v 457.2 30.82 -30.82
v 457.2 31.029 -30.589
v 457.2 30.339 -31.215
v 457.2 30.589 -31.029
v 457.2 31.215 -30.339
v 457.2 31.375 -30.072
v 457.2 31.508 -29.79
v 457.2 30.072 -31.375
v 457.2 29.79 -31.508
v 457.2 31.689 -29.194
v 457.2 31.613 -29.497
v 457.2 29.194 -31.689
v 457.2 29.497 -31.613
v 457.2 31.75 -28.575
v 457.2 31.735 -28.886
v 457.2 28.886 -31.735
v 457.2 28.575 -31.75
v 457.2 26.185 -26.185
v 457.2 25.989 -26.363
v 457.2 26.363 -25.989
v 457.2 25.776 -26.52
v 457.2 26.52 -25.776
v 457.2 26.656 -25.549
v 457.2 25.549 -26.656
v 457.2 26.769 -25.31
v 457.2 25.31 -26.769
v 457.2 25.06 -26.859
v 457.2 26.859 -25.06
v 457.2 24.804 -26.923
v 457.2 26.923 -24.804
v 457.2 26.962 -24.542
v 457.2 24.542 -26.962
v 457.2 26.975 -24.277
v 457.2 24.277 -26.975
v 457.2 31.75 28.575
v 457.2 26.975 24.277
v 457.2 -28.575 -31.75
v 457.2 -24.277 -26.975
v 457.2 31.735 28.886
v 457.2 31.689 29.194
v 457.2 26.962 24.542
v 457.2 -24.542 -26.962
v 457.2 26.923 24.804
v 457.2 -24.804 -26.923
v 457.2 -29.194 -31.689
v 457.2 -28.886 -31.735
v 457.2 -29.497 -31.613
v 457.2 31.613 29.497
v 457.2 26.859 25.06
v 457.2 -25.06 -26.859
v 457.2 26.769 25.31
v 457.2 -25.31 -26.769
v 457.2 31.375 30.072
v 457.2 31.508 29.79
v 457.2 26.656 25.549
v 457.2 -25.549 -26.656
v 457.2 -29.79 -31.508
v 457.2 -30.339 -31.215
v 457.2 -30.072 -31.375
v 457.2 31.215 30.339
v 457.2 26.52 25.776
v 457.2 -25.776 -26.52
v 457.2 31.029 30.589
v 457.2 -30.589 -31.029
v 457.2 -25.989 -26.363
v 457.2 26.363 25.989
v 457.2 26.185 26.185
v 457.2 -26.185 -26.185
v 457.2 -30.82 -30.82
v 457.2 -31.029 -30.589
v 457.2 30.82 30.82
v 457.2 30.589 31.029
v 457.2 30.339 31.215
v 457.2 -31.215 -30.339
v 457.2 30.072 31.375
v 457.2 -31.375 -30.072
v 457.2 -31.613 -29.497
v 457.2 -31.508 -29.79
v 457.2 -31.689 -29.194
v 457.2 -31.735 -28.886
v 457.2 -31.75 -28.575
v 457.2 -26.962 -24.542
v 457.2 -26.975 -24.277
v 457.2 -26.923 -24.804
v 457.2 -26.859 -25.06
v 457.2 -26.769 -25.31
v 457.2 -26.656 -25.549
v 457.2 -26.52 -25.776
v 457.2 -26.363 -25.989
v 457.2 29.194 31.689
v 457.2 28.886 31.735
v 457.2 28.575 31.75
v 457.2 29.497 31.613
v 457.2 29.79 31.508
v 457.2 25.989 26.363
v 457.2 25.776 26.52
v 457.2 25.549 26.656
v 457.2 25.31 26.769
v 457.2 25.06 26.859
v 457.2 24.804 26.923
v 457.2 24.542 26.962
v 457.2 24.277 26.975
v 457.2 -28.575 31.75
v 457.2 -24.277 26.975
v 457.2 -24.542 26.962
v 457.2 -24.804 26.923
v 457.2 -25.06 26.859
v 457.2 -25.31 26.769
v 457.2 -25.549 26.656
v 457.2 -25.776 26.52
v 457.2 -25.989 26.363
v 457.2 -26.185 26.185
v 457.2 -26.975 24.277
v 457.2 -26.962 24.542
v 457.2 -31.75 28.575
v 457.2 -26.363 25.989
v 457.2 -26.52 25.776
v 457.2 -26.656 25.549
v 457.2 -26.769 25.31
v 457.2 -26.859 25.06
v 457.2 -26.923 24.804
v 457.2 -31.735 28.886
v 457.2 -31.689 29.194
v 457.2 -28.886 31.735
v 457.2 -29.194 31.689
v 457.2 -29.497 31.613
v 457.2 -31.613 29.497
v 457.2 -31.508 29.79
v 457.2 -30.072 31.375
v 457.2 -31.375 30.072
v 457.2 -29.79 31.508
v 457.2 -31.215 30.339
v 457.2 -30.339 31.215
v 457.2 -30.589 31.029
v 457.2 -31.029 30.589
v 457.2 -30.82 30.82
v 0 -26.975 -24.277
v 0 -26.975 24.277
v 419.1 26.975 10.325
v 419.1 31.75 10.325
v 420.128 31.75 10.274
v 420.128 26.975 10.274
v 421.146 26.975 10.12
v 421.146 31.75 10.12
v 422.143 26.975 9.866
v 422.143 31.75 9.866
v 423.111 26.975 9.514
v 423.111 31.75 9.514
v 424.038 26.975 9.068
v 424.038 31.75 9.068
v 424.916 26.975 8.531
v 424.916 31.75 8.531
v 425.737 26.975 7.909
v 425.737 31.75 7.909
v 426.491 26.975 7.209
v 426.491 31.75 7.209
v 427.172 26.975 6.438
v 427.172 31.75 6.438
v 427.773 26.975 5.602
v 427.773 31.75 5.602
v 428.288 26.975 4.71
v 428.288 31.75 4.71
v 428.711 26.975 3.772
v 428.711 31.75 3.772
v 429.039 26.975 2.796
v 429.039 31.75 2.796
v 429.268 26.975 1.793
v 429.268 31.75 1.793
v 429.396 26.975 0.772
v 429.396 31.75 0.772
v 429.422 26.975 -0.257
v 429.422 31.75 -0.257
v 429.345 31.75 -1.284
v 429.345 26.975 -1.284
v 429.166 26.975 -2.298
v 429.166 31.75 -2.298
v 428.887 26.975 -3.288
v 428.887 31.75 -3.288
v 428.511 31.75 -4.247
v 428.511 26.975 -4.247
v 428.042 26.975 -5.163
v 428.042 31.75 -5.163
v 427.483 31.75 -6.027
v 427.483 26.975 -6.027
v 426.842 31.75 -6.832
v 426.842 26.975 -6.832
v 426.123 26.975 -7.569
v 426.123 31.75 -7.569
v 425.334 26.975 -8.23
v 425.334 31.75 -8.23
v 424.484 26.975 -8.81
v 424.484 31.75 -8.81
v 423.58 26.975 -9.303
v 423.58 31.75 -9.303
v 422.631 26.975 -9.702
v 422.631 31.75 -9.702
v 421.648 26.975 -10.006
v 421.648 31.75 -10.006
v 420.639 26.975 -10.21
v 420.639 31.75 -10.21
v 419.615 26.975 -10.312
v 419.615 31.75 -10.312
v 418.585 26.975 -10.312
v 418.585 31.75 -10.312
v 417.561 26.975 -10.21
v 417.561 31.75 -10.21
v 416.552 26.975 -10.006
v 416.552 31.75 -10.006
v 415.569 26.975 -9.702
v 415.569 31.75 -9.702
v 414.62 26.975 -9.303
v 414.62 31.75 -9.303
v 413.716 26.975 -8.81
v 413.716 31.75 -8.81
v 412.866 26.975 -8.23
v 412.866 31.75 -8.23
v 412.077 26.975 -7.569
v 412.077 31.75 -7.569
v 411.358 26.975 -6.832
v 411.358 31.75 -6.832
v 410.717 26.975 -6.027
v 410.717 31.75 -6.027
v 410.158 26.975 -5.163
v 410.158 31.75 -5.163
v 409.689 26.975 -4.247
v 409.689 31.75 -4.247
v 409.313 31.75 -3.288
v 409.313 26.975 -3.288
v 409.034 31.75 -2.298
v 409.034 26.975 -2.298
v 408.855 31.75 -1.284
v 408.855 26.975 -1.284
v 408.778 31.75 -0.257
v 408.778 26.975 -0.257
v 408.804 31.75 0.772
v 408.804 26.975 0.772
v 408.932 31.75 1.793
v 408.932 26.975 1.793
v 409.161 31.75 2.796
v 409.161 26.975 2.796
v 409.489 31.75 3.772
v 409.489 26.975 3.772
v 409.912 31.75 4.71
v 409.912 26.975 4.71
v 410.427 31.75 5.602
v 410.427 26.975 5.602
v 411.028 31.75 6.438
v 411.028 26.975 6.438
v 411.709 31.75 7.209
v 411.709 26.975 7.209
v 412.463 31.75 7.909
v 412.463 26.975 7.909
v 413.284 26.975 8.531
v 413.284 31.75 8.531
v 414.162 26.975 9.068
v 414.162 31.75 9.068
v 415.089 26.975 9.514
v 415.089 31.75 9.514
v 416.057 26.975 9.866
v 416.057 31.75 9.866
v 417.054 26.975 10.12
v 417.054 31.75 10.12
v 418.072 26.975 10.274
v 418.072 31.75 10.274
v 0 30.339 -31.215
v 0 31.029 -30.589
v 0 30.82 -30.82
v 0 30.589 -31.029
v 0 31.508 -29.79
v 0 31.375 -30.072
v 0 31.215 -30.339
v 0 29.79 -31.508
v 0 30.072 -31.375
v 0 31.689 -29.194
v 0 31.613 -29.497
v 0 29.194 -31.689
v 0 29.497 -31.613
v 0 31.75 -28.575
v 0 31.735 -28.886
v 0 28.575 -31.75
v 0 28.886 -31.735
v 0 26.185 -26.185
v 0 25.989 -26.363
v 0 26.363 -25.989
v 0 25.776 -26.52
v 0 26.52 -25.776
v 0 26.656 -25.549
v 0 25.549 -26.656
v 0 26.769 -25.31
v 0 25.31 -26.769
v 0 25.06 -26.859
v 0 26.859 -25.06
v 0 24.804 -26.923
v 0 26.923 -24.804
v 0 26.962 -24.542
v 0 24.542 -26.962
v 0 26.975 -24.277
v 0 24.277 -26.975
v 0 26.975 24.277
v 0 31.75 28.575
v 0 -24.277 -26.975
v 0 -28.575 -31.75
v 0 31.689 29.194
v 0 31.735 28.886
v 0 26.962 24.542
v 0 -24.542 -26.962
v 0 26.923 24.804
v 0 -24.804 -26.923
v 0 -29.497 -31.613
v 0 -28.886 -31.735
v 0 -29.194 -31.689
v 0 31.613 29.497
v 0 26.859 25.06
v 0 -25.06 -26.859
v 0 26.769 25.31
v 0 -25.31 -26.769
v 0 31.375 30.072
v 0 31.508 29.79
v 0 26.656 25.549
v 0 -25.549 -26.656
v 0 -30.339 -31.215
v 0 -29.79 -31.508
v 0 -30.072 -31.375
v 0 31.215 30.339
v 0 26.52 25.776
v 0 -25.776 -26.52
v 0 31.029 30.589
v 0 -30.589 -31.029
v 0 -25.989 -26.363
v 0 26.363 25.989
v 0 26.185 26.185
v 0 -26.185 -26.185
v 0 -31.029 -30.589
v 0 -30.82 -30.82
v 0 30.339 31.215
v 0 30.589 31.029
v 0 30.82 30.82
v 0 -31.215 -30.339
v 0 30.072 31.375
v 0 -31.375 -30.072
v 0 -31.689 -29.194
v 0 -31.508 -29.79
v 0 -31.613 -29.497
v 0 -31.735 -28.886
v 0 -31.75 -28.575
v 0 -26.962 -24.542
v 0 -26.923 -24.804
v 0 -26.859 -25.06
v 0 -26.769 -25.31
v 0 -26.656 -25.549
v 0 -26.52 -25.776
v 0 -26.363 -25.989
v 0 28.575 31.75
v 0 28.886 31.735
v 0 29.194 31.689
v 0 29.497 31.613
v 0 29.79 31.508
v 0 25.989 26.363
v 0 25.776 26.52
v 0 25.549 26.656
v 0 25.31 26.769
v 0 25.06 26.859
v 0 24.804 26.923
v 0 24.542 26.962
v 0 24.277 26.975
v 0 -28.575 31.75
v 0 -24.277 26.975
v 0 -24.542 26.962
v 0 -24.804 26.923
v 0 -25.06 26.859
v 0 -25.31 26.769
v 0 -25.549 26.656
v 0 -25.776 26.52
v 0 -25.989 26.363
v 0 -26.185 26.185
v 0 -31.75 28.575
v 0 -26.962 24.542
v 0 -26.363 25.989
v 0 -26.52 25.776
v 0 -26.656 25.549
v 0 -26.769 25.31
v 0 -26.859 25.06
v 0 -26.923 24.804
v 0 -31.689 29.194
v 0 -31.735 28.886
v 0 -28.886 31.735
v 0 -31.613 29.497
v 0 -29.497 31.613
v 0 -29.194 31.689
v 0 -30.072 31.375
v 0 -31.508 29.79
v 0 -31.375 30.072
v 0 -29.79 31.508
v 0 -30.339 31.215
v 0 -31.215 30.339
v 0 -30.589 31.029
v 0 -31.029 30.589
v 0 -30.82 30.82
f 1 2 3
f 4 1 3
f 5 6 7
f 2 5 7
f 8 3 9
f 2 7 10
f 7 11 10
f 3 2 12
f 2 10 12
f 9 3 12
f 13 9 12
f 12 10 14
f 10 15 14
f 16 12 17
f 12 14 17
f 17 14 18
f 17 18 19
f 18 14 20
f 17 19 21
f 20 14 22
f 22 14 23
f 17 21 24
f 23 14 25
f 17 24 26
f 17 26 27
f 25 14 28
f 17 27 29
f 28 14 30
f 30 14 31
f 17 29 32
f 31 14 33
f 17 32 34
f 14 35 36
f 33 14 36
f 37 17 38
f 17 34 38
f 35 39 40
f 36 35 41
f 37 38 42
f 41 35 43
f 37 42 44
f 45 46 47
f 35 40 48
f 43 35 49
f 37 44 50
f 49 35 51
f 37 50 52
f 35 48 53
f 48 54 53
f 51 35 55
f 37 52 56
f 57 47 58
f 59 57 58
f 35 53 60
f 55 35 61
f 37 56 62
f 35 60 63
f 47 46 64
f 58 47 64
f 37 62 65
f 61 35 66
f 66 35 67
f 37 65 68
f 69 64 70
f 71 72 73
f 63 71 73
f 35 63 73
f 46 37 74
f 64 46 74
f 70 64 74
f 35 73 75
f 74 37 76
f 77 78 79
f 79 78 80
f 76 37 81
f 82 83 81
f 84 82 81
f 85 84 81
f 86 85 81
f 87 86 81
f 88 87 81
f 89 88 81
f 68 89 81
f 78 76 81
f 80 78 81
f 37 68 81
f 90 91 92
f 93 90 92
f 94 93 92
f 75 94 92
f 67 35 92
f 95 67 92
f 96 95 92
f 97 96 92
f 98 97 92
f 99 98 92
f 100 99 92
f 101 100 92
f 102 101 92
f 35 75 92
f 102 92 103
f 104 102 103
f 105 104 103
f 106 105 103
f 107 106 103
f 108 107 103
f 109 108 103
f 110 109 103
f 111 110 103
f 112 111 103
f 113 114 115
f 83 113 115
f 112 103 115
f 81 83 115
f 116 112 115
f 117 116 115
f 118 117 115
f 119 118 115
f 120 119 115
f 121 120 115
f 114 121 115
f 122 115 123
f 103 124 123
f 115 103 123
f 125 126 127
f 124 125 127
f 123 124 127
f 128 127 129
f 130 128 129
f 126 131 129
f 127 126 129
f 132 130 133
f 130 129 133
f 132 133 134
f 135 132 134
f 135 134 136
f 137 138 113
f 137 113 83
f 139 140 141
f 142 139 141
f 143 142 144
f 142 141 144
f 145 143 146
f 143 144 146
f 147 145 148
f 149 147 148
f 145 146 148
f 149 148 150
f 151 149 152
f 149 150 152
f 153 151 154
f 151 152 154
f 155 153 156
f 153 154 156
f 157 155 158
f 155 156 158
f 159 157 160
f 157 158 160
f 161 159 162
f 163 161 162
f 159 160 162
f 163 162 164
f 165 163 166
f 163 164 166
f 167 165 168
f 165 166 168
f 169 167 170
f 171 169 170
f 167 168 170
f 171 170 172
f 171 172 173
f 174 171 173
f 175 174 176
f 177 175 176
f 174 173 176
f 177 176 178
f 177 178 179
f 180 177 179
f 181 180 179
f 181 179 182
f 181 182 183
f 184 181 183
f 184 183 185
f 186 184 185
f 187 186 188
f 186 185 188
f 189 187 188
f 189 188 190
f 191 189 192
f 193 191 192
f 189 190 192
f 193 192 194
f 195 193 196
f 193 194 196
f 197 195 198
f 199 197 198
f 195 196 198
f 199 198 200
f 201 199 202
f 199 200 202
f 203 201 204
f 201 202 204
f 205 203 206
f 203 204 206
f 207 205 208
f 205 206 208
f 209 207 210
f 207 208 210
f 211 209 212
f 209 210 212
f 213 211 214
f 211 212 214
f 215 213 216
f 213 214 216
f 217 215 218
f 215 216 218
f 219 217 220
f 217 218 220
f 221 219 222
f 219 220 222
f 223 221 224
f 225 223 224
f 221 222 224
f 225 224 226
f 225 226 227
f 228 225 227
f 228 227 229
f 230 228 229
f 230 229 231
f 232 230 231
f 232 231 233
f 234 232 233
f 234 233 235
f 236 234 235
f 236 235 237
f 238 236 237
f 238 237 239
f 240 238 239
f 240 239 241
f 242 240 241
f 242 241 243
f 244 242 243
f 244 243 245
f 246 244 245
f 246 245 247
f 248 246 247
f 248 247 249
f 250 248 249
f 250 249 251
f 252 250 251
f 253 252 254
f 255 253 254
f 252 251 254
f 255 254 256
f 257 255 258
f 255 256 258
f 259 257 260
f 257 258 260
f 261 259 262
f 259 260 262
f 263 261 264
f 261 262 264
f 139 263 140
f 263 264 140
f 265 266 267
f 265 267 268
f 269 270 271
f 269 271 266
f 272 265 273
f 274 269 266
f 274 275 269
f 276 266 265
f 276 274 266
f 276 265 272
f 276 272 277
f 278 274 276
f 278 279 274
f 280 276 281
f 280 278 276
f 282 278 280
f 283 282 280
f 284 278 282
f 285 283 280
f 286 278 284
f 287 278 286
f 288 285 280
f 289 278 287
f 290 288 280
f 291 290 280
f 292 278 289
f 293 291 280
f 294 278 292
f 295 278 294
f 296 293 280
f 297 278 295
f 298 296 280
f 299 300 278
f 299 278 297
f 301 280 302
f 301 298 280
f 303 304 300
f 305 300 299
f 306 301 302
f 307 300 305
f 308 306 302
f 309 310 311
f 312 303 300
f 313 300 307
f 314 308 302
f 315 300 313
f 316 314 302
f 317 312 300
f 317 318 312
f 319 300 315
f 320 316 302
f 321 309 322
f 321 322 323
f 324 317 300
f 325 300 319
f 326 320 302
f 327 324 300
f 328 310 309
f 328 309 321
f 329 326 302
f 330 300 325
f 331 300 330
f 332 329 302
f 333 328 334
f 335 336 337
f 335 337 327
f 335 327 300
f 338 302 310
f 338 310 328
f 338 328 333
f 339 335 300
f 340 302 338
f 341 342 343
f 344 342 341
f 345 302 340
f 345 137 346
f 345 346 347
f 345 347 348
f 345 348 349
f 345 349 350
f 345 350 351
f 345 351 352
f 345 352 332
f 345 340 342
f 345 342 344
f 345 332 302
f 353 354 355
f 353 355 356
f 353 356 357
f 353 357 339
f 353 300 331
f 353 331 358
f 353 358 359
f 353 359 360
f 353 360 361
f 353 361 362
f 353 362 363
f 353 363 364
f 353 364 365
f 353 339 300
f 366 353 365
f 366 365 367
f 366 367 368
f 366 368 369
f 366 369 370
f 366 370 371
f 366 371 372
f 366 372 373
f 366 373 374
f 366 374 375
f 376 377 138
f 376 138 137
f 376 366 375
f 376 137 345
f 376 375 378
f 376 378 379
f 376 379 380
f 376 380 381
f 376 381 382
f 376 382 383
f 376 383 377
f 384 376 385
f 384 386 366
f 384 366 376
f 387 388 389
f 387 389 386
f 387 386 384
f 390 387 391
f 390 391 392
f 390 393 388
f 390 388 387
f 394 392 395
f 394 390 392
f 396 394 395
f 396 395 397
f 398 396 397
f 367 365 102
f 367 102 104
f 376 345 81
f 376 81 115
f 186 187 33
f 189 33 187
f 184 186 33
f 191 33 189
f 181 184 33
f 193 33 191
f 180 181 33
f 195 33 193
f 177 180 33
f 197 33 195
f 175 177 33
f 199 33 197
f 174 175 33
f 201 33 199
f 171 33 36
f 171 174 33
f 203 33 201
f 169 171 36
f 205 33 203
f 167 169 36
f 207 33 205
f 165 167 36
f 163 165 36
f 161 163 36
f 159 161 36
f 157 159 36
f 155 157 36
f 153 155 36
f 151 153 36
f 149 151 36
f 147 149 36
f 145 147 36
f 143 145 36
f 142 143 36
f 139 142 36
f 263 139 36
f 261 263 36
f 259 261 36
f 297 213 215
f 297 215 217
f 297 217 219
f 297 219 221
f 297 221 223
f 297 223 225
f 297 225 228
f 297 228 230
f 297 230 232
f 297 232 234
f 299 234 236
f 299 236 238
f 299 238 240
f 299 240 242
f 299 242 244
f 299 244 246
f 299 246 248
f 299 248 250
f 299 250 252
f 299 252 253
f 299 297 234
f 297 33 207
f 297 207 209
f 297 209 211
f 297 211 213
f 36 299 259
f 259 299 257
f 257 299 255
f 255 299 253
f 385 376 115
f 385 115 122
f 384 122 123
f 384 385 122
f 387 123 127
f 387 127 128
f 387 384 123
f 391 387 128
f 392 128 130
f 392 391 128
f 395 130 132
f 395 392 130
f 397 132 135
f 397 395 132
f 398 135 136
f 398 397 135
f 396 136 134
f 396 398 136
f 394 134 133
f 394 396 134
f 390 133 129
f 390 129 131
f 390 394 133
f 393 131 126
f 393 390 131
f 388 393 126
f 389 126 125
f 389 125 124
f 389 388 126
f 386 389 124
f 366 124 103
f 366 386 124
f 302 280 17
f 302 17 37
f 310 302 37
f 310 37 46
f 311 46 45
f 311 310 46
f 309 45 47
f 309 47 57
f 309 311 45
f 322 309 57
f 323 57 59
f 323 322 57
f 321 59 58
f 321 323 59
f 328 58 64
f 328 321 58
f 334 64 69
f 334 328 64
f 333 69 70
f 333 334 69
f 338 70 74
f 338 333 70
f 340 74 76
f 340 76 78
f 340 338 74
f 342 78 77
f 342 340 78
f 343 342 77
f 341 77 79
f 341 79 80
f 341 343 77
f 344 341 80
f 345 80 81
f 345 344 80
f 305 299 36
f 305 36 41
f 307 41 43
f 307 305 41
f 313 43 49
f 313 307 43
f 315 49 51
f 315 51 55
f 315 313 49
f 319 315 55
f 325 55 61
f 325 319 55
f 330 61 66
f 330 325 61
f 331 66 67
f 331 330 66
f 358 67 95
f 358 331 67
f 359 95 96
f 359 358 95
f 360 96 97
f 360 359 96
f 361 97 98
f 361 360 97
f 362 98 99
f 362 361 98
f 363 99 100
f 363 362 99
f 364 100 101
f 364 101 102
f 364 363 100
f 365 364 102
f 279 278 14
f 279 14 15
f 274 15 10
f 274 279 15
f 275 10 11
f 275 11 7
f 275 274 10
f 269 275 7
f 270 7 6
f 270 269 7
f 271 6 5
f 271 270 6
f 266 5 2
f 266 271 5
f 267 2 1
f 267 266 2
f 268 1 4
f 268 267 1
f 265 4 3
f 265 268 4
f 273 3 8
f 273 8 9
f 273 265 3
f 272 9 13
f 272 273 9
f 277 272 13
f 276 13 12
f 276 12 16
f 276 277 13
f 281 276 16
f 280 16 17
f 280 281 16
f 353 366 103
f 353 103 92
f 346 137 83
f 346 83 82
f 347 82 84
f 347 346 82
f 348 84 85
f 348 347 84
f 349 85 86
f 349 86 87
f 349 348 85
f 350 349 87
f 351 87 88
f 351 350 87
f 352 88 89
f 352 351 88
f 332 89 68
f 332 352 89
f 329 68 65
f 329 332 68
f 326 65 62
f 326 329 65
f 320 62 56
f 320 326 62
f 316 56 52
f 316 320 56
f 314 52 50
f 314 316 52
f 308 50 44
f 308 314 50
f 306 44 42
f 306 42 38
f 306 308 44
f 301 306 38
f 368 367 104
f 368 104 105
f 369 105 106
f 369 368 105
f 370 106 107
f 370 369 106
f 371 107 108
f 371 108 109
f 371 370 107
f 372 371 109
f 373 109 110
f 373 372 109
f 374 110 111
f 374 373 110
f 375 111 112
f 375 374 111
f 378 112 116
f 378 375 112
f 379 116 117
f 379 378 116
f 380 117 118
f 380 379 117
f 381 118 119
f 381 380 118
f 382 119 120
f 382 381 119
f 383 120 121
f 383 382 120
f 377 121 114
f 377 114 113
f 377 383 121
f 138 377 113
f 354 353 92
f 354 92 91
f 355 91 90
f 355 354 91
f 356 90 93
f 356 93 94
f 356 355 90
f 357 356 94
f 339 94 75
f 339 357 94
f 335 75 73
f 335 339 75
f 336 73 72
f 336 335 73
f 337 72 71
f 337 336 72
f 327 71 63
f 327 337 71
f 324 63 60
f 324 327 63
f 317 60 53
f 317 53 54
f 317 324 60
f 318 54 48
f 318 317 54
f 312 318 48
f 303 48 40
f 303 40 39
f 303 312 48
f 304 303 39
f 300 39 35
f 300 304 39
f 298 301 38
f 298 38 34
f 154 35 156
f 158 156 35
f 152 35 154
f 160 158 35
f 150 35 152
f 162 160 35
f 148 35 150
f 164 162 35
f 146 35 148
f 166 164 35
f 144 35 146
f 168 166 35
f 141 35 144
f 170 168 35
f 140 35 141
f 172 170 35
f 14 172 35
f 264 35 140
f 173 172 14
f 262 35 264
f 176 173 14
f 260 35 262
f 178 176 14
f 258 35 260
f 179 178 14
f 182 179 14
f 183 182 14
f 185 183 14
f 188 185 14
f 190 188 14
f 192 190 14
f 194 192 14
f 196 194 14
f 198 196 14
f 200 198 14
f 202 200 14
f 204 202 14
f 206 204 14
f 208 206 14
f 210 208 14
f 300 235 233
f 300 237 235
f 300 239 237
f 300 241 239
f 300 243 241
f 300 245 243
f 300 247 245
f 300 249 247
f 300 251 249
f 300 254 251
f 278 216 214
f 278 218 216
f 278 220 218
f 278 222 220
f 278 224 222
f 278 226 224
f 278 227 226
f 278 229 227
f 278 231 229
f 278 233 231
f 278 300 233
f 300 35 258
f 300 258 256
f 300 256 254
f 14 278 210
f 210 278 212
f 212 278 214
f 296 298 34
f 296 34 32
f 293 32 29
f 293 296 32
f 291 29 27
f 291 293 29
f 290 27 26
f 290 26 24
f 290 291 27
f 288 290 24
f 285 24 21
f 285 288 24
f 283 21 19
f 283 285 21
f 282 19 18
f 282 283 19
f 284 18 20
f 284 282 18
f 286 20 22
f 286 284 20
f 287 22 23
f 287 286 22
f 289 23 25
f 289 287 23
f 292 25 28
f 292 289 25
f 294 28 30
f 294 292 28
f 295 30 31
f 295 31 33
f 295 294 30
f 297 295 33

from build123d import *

# Parameters (mm, degrees)
SQUARE_TUBE_2_5X2_5X_188_A500_1_DEPTH = 457.2
SKETCH3_R                             = 10.3251
CUT_EXTRUDE1_DEPTH                    = 4.7752


with BuildPart() as part:
    # Sketch1 → Square tube 2.5X2.5X.188 A500(1) (new body)
    with BuildSketch(Plane.YZ):
        with BuildLine():
            Line((28.575, -31.75), (-28.575, -31.75))
            ThreePointArc((-28.575, -31.75), (-30.82006403, -30.82006403), (-31.75, -28.575))
            Line((-31.75, -28.575), (-31.75, 28.575))
            ThreePointArc((-31.75, 28.575), (-30.82006403, 30.82006403), (-28.575, 31.75))
            Line((-28.575, 31.75), (28.575, 31.75))
            ThreePointArc((28.575, 31.75), (30.82006403, 30.82006403), (31.75, 28.575))
            Line((31.75, 28.575), (31.75, -28.575))
            ThreePointArc((31.75, -28.575), (30.82006403, -30.82006403), (28.575, -31.75))
        make_face()
        with BuildLine():
            Line((24.27732, 26.9748), (-24.27732, 26.9748))
            ThreePointArc((-24.27732, 26.9748), (-26.1847264, 26.1847264), (-26.9748, 24.27732))
            Line((-26.9748, 24.27732), (-26.9748, -24.27732))
            ThreePointArc((-26.9748, -24.27732), (-26.1847264, -26.1847264), (-24.27732, -26.9748))
            Line((-24.27732, -26.9748), (24.27732, -26.9748))
            ThreePointArc((24.27732, -26.9748), (26.1847264, -26.1847264), (26.9748, -24.27732))
            Line((26.9748, -24.27732), (26.9748, 24.27732))
            ThreePointArc((26.9748, 24.27732), (26.1847264, 26.1847264), (24.27732, 26.9748))
        make_face(mode=Mode.SUBTRACT)
    extrude(amount=SQUARE_TUBE_2_5X2_5X_188_A500_1_DEPTH)

    # Sketch3 → Cut-Extrude1 (cut)
    with BuildSketch(Plane(origin=(0, 31.75, 0), x_dir=(1, 0, 0), z_dir=(0, 1, 0))):
        with Locations(Location((419.1, 0, 0), (0, 0, 270))):
            Circle(SKETCH3_R)
    extrude(amount=-CUT_EXTRUDE1_DEPTH, mode=Mode.SUBTRACT)


solid = part.part
